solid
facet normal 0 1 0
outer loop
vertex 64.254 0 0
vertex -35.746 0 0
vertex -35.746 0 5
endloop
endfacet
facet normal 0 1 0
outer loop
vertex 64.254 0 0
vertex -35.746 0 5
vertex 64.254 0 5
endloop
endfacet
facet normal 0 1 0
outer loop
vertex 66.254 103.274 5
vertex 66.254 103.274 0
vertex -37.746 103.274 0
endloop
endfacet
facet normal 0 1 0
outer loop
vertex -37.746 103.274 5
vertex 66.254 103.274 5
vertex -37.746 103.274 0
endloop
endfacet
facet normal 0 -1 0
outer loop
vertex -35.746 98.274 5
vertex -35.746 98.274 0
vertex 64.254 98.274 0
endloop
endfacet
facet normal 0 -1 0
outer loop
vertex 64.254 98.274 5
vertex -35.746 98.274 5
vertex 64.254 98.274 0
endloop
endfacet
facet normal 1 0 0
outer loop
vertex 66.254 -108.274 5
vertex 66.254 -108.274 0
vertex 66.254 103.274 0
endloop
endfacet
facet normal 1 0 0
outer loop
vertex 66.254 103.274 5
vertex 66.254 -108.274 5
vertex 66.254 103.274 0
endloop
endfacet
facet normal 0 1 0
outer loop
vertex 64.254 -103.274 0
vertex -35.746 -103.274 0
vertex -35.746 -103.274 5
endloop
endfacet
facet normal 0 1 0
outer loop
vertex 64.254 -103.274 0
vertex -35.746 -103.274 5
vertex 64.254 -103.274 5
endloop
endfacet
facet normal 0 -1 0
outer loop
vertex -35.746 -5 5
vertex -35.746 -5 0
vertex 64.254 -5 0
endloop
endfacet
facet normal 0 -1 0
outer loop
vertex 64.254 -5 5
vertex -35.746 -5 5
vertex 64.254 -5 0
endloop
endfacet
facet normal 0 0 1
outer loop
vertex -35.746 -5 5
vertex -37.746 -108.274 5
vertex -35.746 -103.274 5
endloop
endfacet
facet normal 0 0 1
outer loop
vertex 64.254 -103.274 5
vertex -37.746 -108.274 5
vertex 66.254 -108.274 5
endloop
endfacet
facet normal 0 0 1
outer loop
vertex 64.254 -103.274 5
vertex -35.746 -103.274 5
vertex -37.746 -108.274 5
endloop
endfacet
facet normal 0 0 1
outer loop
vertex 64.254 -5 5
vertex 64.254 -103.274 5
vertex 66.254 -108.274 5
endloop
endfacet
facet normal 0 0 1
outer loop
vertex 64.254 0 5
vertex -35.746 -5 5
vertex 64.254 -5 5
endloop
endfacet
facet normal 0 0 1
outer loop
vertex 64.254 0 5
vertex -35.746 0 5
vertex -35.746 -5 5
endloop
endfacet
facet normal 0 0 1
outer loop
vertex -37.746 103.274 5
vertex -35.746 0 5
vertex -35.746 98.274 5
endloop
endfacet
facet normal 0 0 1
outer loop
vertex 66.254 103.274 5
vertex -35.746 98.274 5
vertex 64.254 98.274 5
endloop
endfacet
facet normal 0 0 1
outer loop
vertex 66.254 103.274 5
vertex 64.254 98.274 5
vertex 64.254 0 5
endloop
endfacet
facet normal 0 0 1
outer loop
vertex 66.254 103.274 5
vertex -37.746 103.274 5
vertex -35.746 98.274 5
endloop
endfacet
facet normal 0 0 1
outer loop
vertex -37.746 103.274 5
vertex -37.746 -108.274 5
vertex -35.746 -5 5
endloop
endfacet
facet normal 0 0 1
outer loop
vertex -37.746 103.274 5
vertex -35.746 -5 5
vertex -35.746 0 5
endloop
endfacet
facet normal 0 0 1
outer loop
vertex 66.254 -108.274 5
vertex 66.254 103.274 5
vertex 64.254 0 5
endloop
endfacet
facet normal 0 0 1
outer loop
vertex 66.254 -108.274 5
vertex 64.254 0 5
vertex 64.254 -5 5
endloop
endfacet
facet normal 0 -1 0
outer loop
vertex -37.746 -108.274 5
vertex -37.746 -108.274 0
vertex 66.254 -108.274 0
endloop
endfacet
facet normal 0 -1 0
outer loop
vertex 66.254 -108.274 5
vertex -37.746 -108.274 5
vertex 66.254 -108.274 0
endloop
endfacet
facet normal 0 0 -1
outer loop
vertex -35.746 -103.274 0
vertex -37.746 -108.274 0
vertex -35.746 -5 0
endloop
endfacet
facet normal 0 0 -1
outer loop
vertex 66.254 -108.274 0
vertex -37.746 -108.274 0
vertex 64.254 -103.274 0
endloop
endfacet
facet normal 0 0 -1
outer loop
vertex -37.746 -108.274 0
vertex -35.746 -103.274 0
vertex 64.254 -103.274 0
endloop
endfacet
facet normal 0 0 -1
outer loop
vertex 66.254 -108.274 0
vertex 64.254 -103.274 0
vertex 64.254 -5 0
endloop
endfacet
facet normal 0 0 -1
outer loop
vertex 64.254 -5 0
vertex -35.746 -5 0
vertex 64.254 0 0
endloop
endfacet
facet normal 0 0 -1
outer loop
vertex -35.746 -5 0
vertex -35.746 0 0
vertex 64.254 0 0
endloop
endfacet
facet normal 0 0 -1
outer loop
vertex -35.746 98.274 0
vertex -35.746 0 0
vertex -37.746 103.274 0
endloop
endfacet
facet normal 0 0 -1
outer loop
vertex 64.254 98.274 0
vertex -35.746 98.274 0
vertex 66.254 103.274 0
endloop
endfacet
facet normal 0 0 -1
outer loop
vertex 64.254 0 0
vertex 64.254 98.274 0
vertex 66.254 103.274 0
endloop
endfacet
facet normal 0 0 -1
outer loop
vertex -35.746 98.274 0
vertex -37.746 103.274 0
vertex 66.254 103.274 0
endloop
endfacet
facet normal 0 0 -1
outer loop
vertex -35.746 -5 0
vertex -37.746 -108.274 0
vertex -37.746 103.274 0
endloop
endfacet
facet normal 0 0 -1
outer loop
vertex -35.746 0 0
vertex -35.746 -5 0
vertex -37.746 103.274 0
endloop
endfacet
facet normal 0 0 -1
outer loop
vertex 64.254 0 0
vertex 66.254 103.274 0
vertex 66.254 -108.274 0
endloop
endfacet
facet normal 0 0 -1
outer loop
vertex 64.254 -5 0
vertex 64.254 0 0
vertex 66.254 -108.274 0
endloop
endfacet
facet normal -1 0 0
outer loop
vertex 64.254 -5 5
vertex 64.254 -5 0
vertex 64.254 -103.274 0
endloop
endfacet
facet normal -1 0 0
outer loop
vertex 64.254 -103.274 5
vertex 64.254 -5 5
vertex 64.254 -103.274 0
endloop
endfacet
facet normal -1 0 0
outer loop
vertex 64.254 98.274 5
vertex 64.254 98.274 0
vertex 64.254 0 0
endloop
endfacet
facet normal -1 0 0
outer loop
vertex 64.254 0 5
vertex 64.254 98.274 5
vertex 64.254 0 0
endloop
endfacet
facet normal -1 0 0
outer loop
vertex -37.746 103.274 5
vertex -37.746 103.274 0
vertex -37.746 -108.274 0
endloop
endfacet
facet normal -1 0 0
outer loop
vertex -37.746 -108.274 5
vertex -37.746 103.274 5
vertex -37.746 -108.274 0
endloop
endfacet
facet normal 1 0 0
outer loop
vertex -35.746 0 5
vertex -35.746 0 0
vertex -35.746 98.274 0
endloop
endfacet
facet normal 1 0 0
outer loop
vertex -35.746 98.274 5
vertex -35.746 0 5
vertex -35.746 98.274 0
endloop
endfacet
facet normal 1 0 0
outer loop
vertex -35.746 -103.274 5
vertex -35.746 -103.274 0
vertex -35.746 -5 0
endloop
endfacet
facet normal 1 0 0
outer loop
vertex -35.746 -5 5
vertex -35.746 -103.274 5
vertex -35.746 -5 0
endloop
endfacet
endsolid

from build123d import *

# Parameters (mm, degrees)
F0_W     = 100
F0_H     = 5
F1_DEPTH = 5


with BuildPart() as f1:
    # F0 (on Top) → F1 (new body)
    with BuildSketch(Plane.XY):
        Polygon((-35.745753, 98.273505), (-35.745753, 103.273505), (-37.745753, 103.273505), (-37.745753, -108.273505), (-35.745753, -108.273505), (-35.745753, -103.273505), (-35.745753, -5), (-35.745753, 0), align=None)
        with Locations((14.254247, -105.773505)):
            Rectangle(F0_W, F0_H)
        with Locations((14.254247, -2.5)):
            Rectangle(F0_W, F0_H)
        with Locations((14.254247, 100.773505)):
            Rectangle(F0_W, F0_H)
        Polygon((66.254247, 103.273505), (64.254247, 103.273505), (64.254247, 98.273505), (64.254247, 0), (64.254247, -5), (64.254247, -103.273505), (64.254247, -108.273505), (66.254247, -108.273505), align=None)
    extrude(amount=F1_DEPTH)


solid = f1.part
